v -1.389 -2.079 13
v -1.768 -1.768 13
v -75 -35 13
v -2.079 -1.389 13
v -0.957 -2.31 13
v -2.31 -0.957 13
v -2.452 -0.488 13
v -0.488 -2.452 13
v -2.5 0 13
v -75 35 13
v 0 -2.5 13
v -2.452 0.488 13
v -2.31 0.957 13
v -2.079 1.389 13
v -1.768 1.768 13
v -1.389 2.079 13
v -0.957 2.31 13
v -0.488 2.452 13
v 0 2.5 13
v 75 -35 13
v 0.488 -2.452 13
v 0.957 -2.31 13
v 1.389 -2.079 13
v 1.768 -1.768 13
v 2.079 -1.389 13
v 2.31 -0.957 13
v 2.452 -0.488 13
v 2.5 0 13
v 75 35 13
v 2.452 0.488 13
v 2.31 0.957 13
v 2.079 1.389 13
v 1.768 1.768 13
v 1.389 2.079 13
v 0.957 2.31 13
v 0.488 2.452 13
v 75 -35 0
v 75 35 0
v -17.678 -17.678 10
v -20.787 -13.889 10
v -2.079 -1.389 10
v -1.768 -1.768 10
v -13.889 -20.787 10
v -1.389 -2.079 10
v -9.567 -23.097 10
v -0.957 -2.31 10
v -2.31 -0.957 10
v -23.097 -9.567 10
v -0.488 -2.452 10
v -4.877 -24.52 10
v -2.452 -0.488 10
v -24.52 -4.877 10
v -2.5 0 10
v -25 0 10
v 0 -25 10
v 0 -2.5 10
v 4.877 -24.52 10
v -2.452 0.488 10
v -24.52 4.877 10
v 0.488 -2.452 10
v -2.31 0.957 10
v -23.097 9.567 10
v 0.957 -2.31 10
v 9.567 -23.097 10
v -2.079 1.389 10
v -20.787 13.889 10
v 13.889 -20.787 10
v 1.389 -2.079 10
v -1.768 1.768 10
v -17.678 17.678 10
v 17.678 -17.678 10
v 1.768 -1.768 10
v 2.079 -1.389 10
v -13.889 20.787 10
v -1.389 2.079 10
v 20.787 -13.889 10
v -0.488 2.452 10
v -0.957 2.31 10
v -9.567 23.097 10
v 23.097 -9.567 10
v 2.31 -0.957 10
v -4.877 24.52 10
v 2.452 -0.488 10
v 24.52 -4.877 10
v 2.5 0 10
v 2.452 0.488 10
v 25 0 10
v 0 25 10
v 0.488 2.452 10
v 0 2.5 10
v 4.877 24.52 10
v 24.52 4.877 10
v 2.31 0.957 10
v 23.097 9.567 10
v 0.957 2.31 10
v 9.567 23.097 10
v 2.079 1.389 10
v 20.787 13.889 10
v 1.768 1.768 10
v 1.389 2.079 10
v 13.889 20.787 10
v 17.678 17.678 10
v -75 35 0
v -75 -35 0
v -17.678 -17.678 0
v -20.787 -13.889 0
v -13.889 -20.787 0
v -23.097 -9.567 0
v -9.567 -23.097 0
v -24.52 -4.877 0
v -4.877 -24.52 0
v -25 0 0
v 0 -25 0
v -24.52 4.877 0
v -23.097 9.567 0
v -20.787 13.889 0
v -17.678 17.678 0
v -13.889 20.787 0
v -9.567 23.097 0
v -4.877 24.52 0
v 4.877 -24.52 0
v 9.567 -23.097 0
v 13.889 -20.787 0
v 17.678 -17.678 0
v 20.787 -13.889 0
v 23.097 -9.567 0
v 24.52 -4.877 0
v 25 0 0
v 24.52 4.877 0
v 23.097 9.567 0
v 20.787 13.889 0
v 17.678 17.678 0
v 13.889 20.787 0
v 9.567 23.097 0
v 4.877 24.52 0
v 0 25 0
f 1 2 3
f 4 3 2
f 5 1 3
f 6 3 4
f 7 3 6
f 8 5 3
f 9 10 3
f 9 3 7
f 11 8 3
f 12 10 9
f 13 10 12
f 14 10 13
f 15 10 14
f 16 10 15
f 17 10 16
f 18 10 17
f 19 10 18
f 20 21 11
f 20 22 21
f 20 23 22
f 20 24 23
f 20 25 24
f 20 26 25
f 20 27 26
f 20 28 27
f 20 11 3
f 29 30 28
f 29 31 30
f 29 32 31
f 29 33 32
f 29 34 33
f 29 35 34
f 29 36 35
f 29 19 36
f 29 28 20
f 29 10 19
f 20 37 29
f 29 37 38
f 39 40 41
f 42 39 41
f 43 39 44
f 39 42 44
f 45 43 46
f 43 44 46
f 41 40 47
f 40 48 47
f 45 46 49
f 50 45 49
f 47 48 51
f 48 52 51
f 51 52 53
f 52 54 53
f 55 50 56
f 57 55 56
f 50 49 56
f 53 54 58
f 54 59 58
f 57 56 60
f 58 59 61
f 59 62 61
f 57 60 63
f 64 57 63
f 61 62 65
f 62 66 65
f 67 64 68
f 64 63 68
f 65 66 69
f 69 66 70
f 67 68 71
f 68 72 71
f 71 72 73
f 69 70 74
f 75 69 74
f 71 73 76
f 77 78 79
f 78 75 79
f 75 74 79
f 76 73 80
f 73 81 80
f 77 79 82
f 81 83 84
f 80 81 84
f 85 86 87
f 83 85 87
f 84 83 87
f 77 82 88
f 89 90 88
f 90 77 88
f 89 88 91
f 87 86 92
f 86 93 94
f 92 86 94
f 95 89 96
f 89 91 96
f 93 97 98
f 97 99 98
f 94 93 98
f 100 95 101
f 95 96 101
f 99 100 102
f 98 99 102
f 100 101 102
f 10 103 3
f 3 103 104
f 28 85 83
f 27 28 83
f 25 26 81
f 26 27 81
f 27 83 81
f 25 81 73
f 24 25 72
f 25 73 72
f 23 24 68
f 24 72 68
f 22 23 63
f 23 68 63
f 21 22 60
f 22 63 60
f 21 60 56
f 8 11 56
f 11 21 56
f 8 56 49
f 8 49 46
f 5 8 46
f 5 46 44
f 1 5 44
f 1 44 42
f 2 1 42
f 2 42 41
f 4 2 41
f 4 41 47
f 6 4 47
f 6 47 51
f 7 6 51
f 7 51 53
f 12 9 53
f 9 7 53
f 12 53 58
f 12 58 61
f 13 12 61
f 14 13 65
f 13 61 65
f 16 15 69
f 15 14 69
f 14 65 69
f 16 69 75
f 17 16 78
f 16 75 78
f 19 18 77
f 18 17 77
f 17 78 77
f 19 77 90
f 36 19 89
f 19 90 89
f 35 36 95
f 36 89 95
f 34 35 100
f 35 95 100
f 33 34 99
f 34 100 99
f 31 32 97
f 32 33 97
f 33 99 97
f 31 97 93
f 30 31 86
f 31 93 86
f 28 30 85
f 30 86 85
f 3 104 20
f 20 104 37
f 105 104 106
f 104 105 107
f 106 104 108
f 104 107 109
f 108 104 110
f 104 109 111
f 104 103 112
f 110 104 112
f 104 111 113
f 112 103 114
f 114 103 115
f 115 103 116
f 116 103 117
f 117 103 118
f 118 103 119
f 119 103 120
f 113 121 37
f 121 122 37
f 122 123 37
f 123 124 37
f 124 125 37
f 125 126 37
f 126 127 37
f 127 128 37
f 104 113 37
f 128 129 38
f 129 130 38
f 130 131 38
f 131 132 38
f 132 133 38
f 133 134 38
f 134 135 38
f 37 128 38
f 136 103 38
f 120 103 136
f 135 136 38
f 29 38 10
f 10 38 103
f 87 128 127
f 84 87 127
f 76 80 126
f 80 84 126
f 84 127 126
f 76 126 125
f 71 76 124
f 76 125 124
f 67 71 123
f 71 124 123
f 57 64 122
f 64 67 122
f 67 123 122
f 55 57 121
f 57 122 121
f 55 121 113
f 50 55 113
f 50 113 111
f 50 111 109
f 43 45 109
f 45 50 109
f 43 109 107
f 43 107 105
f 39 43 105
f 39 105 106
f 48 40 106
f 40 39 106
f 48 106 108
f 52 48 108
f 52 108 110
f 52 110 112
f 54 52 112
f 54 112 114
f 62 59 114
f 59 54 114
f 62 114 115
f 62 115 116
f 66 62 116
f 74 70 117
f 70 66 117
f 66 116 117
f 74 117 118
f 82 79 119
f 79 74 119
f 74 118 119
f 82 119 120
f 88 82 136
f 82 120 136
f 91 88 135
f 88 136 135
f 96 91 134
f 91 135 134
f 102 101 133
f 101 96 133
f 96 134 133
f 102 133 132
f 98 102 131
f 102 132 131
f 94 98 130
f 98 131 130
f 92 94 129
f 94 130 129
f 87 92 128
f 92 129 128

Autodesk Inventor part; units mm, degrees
ref_plane "YZ Plane" through (0, 0, 0) normal (1, 0, 0) x (0, 1, 0)
ref_plane "XZ Plane" through (0, 0, 0) normal (0, 1, 0) x (-1, 0, 0)
ref_plane "XY Plane" through (0, 0, 0) normal (0, 0, 1) x (1, 0, 0)
sketch "Sketch1" plane through (0, 0, 0) normal (0, 0, 1) x (1, 0, 0)
  circle A0 centre (0, 0) radius 25
  line L0 (-75, -35) -> (75, -35)
  line L1 (75, -35) -> (75, 35)
  line L2 (75, 35) -> (-75, 35)
  line L3 (-75, 35) -> (-75, -35)
  line L4 (-75, -35) -> (75, 35) construction
  line L5 (75, -35) -> (-75, 35) construction
  dimension "d0" = 50
  dimension "d2" = 70
  dimension "d3" = 150
extrude "Extrusion1" add sketch "Sketch1" along normal blind 10
sketch "Sketch3" plane through (75, -35, 0) normal (1, 0, 0) x (0, 0, -1)
  line L0 (-90, 0) -> (-90, 70) projected
  line L1 (-90, 35) -> (-50, 35) construction
  circle A0 centre (-50, 35) radius 25
  point P0 (0, 35)
  dimension "d10" = 50
  dimension "d11" = 40
extrude "Extrusion3" cut sketch "Sketch3" against normal through all
sketch "Sketch4" plane through (0, 0, 10) normal (0, 0, 1) x (1, 0, 0)
  line L0 (-75, 35) -> (-75, -35) projected
  line L1 (-75, -35) -> (75, -35) projected
  line L2 (75, -35) -> (75, 35) projected
  line L3 (75, 35) -> (-75, 35) projected
  circle A0 centre (0, 0) radius 25 construction
  circle A1 centre (0, 0) radius 2.5
  dimension "d14" = 5
extrude "Extrusion4" add sketch "Sketch4" along normal blind 3
properties part number "CamBracket"
